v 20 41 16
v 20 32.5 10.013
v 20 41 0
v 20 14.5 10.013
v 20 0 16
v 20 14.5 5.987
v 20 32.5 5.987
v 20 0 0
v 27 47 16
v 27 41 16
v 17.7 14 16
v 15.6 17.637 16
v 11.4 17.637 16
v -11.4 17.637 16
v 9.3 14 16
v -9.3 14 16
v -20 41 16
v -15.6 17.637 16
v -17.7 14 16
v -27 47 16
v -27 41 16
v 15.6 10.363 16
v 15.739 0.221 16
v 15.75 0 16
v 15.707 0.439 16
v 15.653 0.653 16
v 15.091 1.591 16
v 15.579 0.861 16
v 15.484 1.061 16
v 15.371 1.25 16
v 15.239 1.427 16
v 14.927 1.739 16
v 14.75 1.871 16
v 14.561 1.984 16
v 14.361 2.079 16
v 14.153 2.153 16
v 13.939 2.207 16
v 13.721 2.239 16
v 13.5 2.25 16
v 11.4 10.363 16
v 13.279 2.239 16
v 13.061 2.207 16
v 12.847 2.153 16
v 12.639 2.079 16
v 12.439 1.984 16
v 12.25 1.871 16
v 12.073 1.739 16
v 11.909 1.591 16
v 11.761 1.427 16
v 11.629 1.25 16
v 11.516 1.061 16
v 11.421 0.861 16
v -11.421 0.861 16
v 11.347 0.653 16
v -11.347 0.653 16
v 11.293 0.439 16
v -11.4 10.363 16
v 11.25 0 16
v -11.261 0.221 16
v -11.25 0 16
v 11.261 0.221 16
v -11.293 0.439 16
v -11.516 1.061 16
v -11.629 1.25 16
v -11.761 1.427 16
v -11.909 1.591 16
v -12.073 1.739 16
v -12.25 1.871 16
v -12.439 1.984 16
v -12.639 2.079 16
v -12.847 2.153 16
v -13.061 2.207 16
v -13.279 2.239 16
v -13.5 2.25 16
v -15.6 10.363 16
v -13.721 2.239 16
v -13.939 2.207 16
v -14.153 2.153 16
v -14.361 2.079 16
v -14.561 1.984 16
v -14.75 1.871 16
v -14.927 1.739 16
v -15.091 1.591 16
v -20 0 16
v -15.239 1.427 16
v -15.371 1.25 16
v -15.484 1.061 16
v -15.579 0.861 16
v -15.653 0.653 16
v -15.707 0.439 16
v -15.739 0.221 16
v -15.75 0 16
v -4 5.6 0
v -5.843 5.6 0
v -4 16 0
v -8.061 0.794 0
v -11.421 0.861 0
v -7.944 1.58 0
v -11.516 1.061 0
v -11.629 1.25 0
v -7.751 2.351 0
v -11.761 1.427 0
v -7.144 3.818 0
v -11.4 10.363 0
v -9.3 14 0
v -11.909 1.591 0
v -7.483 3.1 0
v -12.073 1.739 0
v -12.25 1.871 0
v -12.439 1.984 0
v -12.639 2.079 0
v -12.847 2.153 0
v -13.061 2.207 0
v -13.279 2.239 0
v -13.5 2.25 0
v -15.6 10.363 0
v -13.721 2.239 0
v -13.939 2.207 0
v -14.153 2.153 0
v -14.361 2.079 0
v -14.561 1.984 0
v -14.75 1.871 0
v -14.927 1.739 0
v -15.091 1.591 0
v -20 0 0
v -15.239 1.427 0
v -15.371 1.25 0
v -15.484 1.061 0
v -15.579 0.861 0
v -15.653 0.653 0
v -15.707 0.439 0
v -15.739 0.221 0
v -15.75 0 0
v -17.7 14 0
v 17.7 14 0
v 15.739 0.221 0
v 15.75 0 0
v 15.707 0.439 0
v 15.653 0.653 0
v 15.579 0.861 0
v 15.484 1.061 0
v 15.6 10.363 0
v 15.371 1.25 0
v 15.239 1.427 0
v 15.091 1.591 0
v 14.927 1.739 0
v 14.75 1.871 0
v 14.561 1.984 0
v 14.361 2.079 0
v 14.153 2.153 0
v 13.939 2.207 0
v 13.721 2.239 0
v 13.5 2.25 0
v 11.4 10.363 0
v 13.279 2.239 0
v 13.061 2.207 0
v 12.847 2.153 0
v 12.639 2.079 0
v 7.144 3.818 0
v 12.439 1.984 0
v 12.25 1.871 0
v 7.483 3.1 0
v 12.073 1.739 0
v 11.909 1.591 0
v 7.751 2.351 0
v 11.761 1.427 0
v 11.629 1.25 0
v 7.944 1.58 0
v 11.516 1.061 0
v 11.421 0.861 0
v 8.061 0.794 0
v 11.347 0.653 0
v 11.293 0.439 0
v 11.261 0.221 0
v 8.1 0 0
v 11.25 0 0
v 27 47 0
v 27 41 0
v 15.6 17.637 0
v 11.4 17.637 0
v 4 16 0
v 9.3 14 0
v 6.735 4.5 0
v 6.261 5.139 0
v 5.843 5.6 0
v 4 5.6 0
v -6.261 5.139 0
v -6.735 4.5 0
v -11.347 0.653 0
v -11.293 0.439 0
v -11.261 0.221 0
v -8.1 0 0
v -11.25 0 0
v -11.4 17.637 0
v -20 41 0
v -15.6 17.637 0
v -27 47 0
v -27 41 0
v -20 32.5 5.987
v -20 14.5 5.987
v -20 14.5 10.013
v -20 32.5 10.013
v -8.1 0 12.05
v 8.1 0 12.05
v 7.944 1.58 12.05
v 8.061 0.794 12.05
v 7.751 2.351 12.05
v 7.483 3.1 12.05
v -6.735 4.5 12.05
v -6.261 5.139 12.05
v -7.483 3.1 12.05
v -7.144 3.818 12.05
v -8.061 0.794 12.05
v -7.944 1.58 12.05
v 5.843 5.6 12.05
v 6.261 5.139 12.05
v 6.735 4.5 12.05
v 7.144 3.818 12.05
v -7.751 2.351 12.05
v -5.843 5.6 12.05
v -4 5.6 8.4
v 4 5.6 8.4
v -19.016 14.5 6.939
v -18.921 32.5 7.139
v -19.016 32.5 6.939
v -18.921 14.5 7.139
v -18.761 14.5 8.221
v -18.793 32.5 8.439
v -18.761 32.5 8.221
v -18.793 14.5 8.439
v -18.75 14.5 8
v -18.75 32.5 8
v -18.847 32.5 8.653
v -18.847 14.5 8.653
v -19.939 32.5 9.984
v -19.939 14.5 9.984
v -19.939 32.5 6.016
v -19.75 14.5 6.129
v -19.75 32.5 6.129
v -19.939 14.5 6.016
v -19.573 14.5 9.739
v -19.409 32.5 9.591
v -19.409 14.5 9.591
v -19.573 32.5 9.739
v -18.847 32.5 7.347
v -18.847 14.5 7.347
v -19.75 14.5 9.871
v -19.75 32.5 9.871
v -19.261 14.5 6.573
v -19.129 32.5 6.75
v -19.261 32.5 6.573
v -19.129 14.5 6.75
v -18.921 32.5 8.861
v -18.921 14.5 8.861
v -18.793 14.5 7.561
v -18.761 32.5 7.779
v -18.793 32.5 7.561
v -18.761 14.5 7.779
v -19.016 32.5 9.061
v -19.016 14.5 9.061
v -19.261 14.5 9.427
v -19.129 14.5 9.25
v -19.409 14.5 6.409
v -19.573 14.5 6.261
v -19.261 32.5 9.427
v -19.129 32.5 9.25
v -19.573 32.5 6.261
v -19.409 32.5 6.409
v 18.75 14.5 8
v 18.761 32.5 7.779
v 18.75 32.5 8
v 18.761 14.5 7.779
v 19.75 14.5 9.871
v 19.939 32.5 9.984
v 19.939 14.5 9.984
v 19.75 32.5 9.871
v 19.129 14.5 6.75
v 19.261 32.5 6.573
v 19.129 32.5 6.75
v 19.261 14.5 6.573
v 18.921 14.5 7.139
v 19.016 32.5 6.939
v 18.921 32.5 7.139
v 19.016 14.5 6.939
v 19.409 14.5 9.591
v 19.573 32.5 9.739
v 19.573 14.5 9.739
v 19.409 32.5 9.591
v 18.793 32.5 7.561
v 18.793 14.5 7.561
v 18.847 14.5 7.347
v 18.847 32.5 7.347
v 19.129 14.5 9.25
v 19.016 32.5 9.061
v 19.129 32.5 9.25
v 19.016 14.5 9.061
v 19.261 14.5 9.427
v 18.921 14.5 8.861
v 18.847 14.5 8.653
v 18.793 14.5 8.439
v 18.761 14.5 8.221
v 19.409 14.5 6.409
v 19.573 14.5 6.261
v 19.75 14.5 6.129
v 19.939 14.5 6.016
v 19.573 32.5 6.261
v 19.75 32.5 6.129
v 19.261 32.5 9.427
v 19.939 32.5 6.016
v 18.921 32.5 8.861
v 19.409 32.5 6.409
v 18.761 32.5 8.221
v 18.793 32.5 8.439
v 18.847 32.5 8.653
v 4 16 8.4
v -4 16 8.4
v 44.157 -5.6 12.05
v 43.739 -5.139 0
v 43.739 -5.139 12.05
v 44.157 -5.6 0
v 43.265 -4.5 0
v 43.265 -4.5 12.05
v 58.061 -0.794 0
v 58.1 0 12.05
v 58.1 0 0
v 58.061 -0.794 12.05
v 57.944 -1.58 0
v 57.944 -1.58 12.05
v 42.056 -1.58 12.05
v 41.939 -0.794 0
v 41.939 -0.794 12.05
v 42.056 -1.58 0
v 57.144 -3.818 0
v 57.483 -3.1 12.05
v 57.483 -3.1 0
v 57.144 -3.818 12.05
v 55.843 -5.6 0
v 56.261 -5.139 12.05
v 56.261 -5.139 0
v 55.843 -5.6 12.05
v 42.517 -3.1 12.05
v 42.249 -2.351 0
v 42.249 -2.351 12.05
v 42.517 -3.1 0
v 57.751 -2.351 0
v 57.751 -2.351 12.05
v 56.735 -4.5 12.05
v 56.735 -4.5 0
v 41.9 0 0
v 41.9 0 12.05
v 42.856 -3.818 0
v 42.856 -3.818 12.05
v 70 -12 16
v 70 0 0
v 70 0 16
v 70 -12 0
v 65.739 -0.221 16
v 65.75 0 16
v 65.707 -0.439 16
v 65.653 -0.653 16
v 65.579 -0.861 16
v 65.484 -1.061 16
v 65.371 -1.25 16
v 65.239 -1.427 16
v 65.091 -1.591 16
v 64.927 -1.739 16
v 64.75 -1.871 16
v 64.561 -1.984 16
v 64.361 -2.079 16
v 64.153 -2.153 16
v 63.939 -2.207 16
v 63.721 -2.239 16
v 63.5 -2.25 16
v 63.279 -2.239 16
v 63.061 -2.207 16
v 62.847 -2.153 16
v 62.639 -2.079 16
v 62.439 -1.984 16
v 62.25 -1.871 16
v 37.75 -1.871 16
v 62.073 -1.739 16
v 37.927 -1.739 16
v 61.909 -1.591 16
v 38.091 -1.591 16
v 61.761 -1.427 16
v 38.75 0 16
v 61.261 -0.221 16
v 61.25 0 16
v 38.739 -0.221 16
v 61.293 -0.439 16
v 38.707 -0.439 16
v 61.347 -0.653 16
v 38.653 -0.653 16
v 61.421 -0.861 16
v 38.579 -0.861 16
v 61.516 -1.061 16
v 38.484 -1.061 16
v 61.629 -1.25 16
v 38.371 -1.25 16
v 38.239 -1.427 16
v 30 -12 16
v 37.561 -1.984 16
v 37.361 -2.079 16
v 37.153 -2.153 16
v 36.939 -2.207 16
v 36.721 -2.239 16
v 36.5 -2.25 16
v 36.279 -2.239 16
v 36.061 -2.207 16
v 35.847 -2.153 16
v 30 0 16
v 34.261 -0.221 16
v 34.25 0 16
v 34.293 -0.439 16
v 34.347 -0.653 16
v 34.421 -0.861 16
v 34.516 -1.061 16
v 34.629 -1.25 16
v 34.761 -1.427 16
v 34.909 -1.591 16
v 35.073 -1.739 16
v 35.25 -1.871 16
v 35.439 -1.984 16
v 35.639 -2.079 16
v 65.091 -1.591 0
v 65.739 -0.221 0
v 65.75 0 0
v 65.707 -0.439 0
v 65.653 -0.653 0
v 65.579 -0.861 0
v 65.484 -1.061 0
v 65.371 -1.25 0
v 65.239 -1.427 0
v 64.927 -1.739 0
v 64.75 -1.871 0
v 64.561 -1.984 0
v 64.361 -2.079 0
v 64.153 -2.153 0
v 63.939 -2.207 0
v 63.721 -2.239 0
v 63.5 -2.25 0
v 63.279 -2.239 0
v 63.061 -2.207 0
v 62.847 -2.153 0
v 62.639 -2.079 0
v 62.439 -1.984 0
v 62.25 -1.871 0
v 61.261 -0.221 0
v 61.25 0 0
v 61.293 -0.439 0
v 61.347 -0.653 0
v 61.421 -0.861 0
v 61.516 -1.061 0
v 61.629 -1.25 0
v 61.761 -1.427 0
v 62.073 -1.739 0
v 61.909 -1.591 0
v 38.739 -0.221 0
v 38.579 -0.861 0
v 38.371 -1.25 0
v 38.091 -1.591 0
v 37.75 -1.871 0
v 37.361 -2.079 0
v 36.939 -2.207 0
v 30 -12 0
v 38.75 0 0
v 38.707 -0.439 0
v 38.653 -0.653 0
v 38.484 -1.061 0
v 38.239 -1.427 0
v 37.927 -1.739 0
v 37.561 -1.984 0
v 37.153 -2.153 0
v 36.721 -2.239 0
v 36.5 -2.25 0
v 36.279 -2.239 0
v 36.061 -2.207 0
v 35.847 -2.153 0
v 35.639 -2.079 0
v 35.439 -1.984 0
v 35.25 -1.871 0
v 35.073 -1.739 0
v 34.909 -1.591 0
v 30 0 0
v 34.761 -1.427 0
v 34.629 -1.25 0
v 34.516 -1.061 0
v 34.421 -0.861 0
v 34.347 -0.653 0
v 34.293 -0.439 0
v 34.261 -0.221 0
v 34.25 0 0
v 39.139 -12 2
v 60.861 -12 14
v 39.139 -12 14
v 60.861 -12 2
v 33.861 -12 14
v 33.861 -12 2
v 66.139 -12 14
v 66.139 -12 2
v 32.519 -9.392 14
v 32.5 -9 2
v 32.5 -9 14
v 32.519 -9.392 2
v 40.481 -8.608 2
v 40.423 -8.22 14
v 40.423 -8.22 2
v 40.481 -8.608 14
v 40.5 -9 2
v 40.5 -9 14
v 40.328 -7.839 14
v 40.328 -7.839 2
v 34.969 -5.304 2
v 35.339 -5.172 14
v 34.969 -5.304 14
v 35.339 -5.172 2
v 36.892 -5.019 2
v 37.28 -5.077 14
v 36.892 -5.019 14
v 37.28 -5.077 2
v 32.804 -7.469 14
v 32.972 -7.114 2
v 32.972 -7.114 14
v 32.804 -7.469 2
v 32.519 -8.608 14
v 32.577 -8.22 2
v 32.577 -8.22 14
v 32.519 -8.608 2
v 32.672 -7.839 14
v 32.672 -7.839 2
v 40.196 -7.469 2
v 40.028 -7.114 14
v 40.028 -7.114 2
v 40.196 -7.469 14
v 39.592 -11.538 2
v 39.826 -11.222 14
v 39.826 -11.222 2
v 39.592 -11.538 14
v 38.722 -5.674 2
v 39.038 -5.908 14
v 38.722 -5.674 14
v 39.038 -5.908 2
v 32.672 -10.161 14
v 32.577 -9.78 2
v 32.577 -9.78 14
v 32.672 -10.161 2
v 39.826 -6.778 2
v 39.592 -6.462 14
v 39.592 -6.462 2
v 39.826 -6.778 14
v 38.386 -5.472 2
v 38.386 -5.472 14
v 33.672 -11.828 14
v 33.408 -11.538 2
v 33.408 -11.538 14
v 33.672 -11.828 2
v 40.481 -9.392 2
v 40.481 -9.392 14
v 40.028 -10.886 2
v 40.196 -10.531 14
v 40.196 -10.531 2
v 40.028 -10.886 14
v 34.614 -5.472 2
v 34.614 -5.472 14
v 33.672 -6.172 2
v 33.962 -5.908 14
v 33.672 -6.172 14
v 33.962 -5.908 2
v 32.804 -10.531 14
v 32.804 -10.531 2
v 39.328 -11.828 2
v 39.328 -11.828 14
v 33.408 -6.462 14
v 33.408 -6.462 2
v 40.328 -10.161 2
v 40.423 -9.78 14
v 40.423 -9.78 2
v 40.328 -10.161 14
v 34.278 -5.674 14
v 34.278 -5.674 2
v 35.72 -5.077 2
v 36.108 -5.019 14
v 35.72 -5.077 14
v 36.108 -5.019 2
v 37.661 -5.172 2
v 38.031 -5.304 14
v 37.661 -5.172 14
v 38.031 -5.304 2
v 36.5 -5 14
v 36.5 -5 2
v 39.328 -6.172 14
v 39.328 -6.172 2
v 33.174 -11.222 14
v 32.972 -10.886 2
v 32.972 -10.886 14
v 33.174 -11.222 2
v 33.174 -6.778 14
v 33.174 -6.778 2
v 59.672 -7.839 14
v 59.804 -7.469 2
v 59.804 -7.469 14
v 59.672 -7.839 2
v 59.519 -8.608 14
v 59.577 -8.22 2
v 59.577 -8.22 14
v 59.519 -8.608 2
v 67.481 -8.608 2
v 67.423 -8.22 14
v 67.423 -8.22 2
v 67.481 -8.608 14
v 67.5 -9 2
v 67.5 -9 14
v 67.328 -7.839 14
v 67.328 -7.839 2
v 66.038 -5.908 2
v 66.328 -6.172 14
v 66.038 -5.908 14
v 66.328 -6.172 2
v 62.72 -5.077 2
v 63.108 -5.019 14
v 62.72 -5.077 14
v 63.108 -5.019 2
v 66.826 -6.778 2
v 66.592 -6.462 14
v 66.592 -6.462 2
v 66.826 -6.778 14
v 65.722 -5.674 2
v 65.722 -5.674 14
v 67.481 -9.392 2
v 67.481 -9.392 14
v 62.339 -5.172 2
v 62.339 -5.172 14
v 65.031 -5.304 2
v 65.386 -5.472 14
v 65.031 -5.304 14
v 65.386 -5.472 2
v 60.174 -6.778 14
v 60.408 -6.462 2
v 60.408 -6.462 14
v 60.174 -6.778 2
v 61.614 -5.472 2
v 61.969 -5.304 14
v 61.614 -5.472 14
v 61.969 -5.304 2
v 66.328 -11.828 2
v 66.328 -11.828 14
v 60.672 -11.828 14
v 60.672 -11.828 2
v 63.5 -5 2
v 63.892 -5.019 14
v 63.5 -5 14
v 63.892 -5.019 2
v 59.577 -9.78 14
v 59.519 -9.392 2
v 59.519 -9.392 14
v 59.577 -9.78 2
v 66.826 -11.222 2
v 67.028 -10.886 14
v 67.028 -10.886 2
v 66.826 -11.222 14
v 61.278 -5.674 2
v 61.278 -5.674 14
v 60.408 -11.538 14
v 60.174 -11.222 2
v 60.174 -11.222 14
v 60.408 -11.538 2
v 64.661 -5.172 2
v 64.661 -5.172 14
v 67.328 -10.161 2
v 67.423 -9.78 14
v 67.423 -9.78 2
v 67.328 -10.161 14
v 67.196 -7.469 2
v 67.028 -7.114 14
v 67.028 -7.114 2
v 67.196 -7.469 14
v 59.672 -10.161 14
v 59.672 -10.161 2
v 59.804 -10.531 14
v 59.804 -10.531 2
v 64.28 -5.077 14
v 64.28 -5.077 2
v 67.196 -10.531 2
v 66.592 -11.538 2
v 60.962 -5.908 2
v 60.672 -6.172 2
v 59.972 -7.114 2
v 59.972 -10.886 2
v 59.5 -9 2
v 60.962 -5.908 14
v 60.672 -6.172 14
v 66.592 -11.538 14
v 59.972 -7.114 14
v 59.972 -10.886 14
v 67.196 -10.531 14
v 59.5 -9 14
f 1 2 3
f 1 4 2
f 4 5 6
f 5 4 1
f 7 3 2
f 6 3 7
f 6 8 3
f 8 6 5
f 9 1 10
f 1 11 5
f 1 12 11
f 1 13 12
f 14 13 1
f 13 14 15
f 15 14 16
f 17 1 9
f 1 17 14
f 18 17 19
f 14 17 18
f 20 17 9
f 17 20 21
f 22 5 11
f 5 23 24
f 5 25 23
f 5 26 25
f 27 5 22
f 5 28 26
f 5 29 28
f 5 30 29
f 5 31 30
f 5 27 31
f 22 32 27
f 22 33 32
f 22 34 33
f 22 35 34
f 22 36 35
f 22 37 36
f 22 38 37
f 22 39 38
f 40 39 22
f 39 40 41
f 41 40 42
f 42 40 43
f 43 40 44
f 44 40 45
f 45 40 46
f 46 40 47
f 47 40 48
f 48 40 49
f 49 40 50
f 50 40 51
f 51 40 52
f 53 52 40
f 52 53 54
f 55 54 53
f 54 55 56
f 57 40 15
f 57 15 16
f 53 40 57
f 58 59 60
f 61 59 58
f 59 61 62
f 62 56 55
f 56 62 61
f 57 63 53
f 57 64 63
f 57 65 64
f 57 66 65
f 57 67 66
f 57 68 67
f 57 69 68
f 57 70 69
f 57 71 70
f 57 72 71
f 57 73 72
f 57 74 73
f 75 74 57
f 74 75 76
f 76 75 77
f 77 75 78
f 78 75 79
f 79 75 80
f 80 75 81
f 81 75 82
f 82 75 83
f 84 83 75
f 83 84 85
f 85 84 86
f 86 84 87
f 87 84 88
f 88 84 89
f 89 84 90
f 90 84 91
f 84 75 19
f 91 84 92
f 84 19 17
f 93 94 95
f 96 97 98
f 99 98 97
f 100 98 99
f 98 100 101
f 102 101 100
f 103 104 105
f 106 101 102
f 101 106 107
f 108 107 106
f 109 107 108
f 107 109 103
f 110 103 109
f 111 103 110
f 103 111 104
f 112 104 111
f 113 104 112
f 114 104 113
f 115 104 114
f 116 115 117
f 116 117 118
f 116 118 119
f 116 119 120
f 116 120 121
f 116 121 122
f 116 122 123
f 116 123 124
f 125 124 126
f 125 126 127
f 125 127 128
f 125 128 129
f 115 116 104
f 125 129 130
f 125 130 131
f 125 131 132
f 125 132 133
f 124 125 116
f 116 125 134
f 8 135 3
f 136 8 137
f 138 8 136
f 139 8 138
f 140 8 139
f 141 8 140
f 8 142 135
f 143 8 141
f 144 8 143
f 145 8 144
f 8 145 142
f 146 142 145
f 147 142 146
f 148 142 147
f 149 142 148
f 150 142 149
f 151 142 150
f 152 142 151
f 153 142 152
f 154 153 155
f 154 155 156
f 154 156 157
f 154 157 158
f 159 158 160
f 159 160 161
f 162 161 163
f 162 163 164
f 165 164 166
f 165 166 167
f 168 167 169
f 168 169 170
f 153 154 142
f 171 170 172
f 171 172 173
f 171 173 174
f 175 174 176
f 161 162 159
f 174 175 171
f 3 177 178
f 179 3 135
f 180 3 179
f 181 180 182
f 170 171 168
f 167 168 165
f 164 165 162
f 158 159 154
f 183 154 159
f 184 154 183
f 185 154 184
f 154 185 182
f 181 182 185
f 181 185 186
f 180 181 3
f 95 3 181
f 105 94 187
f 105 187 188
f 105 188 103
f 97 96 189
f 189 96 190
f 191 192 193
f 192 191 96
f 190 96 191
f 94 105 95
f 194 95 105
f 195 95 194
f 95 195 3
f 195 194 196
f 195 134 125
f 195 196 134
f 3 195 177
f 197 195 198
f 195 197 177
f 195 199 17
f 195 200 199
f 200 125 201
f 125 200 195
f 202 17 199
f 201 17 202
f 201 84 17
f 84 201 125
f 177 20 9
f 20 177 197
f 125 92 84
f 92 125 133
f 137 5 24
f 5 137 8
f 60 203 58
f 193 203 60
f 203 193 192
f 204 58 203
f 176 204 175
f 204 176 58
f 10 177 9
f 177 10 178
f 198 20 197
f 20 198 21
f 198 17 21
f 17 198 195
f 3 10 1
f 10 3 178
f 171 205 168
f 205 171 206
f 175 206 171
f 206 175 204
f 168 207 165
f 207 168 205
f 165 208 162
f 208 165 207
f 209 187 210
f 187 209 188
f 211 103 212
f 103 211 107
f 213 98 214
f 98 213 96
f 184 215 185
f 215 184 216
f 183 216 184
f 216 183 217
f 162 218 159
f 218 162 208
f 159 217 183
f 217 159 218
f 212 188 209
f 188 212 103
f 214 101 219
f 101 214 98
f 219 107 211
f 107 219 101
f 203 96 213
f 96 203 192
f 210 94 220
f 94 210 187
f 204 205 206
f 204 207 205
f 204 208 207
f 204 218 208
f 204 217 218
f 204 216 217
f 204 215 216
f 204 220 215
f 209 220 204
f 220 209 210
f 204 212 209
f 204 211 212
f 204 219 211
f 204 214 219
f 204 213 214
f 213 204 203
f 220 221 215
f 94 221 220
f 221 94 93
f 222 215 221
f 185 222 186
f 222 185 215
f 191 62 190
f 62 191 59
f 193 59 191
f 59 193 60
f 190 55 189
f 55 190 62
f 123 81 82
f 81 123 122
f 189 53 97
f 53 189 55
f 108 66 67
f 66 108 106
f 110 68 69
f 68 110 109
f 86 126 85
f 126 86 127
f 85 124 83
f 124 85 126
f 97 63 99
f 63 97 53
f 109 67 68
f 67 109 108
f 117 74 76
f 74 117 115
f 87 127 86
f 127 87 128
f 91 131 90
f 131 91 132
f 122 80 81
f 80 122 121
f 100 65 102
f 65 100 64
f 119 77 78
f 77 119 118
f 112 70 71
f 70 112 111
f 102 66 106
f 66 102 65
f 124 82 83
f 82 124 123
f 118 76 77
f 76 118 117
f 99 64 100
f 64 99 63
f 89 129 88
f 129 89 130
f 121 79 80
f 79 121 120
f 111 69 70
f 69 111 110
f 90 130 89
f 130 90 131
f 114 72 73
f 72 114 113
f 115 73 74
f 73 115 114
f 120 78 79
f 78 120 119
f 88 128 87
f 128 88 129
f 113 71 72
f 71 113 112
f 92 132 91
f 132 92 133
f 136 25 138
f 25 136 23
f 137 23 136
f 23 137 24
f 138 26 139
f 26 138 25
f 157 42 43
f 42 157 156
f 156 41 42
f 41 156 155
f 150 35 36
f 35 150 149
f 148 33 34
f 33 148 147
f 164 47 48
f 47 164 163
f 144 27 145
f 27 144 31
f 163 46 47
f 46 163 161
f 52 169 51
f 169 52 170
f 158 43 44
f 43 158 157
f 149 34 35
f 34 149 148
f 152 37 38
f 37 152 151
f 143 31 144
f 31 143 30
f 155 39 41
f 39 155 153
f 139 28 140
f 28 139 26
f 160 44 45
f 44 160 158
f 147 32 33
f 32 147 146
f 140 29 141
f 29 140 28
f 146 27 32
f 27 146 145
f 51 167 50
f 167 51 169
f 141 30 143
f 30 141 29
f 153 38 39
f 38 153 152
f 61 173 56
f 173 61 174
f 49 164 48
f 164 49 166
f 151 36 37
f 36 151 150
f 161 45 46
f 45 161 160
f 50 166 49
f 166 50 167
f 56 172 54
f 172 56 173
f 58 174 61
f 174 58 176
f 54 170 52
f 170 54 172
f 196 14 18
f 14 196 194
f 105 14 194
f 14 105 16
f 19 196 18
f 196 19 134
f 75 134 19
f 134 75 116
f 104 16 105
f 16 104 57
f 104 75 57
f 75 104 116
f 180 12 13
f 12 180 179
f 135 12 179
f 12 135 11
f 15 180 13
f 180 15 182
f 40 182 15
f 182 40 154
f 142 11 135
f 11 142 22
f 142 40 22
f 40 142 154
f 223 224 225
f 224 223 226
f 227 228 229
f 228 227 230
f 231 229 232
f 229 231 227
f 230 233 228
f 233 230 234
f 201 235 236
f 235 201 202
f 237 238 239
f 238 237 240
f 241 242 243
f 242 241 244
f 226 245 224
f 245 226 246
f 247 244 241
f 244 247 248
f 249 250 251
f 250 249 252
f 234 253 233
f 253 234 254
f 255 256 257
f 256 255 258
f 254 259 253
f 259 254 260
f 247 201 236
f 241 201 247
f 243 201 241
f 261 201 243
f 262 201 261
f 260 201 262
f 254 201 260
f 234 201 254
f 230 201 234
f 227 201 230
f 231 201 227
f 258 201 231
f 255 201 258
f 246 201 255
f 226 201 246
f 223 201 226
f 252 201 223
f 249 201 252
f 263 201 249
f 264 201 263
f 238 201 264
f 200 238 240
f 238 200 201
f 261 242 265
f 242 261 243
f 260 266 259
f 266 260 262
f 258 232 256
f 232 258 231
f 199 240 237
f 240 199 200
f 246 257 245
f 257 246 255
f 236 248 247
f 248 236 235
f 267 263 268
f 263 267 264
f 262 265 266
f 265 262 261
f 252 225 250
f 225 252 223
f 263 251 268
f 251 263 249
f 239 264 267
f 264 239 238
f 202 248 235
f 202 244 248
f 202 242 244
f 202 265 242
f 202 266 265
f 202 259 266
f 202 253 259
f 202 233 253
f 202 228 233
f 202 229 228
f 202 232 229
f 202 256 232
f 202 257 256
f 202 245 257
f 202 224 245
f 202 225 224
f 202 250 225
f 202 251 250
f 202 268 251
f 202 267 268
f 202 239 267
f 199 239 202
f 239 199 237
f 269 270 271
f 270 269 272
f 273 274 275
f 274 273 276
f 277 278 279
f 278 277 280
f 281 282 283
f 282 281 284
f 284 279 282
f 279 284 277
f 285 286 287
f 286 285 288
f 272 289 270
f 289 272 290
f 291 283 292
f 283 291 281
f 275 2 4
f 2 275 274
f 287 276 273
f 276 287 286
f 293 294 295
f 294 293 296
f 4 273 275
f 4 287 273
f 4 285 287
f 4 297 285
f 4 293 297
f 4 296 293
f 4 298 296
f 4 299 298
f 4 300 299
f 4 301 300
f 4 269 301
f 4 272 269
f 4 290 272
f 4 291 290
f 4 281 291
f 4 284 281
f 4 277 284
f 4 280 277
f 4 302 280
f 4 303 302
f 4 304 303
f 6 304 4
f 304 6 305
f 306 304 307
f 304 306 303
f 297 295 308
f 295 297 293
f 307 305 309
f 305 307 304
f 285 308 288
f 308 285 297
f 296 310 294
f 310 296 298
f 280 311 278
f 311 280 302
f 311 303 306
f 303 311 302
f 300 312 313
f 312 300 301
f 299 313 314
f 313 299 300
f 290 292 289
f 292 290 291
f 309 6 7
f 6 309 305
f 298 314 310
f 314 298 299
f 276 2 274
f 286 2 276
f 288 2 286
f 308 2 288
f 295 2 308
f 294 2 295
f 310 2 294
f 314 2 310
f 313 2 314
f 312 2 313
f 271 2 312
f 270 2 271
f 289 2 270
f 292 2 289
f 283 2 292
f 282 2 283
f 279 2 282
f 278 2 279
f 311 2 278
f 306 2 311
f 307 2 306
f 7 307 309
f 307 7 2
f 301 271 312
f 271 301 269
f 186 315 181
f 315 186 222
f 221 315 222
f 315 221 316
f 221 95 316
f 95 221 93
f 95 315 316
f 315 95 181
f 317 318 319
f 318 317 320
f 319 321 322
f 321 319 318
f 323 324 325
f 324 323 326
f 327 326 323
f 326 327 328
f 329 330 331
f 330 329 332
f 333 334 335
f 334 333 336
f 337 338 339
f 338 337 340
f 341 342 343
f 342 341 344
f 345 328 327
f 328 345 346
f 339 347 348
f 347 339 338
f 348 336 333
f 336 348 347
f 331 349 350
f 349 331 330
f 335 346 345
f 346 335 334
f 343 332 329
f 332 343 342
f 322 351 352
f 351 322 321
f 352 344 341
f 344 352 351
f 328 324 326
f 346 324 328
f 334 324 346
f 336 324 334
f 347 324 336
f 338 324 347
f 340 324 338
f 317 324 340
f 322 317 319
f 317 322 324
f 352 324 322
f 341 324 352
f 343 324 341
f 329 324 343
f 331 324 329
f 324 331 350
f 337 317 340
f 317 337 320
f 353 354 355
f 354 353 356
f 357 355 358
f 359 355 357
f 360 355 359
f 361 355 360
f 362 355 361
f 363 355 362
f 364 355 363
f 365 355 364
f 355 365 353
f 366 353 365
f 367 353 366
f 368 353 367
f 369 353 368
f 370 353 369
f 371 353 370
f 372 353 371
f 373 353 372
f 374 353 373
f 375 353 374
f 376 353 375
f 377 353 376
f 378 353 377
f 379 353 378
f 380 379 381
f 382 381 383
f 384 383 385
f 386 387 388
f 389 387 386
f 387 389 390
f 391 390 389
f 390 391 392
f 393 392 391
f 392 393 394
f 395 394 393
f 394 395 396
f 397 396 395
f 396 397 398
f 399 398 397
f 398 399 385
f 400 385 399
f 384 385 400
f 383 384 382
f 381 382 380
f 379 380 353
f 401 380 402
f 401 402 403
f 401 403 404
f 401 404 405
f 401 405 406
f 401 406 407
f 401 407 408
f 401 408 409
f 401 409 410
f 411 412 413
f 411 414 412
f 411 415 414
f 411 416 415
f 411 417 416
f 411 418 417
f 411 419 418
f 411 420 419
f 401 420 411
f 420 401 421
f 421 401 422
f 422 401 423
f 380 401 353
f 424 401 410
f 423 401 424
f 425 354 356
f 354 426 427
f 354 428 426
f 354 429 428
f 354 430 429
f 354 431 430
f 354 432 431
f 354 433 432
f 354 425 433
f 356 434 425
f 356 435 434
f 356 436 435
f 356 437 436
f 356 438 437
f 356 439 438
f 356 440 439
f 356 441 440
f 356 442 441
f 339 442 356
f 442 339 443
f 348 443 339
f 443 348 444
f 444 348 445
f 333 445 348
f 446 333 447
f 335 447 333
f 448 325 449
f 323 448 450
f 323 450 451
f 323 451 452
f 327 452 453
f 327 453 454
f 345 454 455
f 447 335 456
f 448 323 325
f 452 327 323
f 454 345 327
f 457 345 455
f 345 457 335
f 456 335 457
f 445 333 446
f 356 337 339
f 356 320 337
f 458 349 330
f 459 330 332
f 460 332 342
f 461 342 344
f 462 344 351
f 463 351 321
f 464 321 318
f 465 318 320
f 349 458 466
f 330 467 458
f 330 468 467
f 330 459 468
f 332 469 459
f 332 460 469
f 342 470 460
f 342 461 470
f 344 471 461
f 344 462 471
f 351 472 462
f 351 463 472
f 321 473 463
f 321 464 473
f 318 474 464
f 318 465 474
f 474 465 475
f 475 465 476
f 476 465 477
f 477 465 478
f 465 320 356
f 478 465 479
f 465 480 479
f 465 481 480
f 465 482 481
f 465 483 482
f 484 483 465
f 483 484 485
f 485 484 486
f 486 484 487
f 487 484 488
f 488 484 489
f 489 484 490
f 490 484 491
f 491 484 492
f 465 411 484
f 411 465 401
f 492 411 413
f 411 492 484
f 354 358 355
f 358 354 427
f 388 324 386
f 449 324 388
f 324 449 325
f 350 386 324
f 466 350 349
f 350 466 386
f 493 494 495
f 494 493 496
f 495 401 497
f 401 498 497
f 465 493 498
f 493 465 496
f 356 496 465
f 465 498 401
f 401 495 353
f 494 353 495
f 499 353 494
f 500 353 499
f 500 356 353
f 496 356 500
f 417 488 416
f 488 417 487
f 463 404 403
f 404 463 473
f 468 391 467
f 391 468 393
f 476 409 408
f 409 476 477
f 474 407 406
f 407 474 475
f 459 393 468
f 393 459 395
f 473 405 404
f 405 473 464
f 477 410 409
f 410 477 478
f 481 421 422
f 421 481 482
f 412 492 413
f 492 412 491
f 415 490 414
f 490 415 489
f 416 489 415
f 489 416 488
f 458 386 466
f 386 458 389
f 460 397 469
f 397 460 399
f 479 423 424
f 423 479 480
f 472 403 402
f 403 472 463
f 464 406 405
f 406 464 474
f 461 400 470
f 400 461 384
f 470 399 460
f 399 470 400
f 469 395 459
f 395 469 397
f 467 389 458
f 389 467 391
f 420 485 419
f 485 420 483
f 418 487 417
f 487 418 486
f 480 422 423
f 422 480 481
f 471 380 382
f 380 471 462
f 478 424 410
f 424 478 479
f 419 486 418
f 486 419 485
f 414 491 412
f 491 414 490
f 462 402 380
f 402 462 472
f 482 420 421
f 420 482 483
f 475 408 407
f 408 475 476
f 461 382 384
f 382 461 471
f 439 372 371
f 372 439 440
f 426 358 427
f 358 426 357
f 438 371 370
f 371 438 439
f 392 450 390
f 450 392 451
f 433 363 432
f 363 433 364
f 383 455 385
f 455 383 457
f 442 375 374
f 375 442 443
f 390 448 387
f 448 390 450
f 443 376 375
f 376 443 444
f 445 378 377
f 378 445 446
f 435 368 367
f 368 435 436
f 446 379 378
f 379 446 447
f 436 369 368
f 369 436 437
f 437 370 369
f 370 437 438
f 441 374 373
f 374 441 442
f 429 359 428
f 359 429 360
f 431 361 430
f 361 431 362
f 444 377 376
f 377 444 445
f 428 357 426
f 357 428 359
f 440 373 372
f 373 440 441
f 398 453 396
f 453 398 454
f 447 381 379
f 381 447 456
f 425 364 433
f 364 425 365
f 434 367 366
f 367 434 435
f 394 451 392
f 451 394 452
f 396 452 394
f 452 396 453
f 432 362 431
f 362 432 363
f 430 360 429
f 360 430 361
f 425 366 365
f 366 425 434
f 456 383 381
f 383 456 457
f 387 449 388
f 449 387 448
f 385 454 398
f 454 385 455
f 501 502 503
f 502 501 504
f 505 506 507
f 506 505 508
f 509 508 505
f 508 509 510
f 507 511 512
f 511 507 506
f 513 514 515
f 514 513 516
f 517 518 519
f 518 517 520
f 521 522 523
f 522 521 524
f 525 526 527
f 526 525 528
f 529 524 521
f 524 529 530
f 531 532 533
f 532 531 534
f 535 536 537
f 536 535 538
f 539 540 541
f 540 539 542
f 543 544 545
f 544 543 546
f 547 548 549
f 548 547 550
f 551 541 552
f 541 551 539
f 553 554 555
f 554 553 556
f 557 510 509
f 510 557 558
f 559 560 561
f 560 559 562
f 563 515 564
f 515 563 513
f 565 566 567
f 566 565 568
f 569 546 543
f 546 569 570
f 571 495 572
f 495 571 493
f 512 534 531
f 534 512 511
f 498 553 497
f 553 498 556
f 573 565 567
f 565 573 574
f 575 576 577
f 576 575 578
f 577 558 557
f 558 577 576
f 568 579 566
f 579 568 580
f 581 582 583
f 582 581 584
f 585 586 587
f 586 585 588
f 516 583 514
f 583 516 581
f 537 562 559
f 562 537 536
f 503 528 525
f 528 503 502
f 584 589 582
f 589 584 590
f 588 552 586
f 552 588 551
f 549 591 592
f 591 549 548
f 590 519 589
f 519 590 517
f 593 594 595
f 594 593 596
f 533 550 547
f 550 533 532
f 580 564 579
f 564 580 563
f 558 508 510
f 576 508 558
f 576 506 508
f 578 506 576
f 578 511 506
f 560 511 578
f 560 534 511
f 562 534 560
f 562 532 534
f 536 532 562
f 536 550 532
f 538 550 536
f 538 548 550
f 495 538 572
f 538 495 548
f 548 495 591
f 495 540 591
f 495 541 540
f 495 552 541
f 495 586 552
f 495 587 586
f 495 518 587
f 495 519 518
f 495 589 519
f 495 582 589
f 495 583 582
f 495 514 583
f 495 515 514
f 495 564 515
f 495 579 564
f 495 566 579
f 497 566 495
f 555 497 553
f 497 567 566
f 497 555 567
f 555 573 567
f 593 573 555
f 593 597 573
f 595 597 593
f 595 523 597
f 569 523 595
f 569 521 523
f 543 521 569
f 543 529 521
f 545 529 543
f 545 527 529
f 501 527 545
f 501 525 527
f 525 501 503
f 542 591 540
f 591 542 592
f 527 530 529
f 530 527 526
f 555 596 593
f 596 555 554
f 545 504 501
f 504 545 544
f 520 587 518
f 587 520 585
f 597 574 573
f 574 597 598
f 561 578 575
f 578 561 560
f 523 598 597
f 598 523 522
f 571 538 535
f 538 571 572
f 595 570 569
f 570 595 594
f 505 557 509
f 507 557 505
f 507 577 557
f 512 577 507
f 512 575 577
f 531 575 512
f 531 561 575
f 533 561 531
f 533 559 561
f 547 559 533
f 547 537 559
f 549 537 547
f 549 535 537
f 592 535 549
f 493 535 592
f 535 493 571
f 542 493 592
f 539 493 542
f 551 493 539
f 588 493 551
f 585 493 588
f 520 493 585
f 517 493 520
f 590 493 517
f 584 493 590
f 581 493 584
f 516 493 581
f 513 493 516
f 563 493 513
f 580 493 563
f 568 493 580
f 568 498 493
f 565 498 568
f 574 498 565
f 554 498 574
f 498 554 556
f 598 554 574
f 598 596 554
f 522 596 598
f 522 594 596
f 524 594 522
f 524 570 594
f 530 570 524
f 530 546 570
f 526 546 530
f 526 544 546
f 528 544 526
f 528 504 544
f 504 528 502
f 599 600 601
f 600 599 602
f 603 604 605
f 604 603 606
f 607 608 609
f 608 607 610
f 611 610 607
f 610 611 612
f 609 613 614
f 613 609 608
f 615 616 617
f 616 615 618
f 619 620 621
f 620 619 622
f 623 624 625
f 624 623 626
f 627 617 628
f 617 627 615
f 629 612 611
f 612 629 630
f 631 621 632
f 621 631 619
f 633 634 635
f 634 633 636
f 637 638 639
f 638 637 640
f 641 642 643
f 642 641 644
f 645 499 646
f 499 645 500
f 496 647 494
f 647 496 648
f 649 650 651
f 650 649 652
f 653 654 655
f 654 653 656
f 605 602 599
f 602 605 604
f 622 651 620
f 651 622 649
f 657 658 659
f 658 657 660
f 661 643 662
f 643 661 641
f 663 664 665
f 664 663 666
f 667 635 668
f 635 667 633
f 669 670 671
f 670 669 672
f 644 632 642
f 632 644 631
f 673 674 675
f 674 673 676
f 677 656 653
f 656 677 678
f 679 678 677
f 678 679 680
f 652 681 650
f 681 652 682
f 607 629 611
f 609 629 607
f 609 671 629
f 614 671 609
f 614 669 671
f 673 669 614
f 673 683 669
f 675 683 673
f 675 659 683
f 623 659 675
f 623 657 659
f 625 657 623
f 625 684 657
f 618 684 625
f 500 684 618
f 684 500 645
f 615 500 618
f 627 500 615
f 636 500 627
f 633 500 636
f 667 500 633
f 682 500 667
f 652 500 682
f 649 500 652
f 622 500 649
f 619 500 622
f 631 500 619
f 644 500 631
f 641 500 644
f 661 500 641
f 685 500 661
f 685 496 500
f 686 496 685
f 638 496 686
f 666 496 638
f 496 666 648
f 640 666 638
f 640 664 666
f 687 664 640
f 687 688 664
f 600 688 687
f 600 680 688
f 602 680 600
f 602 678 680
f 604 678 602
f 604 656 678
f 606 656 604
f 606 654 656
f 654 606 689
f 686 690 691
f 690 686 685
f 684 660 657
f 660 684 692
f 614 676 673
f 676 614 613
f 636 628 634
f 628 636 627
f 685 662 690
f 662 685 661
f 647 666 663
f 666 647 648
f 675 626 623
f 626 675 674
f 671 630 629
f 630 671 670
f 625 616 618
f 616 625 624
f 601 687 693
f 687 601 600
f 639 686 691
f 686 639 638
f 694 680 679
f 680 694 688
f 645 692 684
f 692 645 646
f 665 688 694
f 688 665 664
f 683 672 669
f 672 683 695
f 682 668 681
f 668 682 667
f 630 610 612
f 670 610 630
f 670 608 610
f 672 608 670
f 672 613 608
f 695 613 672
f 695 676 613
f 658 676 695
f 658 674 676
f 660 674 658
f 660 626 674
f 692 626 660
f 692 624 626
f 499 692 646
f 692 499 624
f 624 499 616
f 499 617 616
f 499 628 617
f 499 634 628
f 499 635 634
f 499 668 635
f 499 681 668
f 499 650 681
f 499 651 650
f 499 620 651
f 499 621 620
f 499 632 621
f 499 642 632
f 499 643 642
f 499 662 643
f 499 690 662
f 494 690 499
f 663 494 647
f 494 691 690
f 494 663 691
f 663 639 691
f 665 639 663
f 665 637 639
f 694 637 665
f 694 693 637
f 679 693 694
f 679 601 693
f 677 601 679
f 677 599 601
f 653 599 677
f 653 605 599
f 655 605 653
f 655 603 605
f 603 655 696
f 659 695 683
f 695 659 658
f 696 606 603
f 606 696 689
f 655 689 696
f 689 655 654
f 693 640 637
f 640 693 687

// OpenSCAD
// ═══════════════════════════════════════════════════════════════════════════════
//      R2-D2 RAZOR HUB MOTOR 16x11mm AXLE CLAMPING MOUNT (PARAMETRIC)
// ═══════════════════════════════════════════════════════════════════════════════
// Designed for 16mm OD / 11mm Flat-to-Flat Double-D Stationary Axles
// Fits Home Depot R2-D2 Foot Shells for 12mm Ground Clearance

$fn = 64;

// ─── PARAMETERS ───
axle_dia      = 16.2; // Major outer rounded diameter (+0.2mm tolerance)
axle_flat     = 11.2; // Minor width across flats (+0.2mm tolerance)
axle_length   = 12.0; // Depth of axle engagement pocket
wall_thick    = 4.0;  // Backing wall thickness
clamp_width   = 40.0; // Total width of clamp body (X-axis)
clamp_depth   = axle_length + wall_thick; // Total thickness (16mm)
top_height    = 47.0; // Height from axle center to top mounting plate
bot_height    = 12.0; // Height of bottom cap
bolt_spacing  = 27.0; // Spacing between clamp bolts (X-axis)
bolt_dia      = 4.5;  // M4 clearance hole (Ø4.5mm)
flange_width  = 54.0; // Top mounting flange width
flange_thick  = 6.0;  // Top mounting flange thickness
flange_hole_x = 21.0; // Top mounting hole spacing (+/- 21mm)

// ─── DOUBLE-D AXLE PROFILE MODULE ───
module double_d_axle(h) {
    intersection() {
        cylinder(d=axle_dia, h=h, center=true);
        cube([axle_dia + 2, axle_flat, h + 1], center=true);
    }
}

// ─── 1. TOP CLAMP BRACKET (MAIN MOUNT) ───
module top_clamp_bracket(with_wire_slot=true) {
    difference() {
        union() {
            // Main vertical body
            translate([0, top_height/2, clamp_depth/2])
                cube([clamp_width, top_height, clamp_depth], center=true);
            
            // Top mounting flange
            translate([0, top_height - flange_thick/2, clamp_depth/2])
                cube([flange_width, flange_thick, clamp_depth], center=true);
        }

        // Axle Pocket (Top Half)
        translate([0, 0, axle_length/2])
            double_d_axle(axle_length + 0.1);

        // Clamping Bolt Holes (Left and Right M4 clearance)
        translate([-bolt_spacing/2, 0, clamp_depth/2])
            cylinder(d=bolt_dia, h=clamp_depth*3, center=true);
        translate([bolt_spacing/2, 0, clamp_depth/2])
            cylinder(d=bolt_dia, h=clamp_depth*3, center=true);

        // M4 Hex Nut Traps in Top Bracket
        translate([-bolt_spacing/2, 14, clamp_depth/2])
            cylinder(r=4.2, h=clamp_depth+1, $fn=6, center=true);
        translate([bolt_spacing/2, 14, clamp_depth/2])
            cylinder(r=4.2, h=clamp_depth+1, $fn=6, center=true);

        // Top Frame Mounting Holes (2x M4/M5 holes through flange)
        translate([-flange_hole_x, top_height/2, clamp_depth/2])
            rotate([90, 0, 0])
                cylinder(d=bolt_dia, h=flange_thick*3, center=true);
        translate([flange_hole_x, top_height/2, clamp_depth/2])
            rotate([90, 0, 0])
                cylinder(d=bolt_dia, h=flange_thick*3, center=true);

        // Motor Wire Escape Channel (6mm x 8mm curved slot)
        if (with_wire_slot) {
            translate([0, 8, -0.1])
                cube([8.0, 16.0, clamp_depth + 1], center=true);
        }
    }
}

// ─── 2. BOTTOM CLAMP CAP ───
module bottom_clamp_cap() {
    difference() {
        // Main bottom body
        translate([0, -bot_height/2, clamp_depth/2])
            cube([clamp_width, bot_height, clamp_depth], center=true);

        // Axle Pocket (Bottom Half)
        translate([0, 0, axle_length/2])
            double_d_axle(axle_length + 0.1);

        // Clamping Bolt Holes
        translate([-bolt_spacing/2, 0, clamp_depth/2])
            cylinder(d=bolt_dia, h=clamp_depth*3, center=true);
        translate([bolt_spacing/2, 0, clamp_depth/2])
            cylinder(d=bolt_dia, h=clamp_depth*3, center=true);

        // Counterbore for M4 Socket Head Bolt Heads
        translate([-bolt_spacing/2, -bot_height + 3, clamp_depth/2])
            cylinder(d=8.0, h=bot_height, center=true);
        translate([bolt_spacing/2, -bot_height + 3, clamp_depth/2])
            cylinder(d=8.0, h=bot_height, center=true);
    }
}

// ─── ASSEMBLY VIEW ───
// To view top bracket:
top_clamp_bracket(with_wire_slot=true);

// To view bottom cap (separated for printing):
translate([clamp_width + 10, 0, 0])
    bottom_clamp_cap();
